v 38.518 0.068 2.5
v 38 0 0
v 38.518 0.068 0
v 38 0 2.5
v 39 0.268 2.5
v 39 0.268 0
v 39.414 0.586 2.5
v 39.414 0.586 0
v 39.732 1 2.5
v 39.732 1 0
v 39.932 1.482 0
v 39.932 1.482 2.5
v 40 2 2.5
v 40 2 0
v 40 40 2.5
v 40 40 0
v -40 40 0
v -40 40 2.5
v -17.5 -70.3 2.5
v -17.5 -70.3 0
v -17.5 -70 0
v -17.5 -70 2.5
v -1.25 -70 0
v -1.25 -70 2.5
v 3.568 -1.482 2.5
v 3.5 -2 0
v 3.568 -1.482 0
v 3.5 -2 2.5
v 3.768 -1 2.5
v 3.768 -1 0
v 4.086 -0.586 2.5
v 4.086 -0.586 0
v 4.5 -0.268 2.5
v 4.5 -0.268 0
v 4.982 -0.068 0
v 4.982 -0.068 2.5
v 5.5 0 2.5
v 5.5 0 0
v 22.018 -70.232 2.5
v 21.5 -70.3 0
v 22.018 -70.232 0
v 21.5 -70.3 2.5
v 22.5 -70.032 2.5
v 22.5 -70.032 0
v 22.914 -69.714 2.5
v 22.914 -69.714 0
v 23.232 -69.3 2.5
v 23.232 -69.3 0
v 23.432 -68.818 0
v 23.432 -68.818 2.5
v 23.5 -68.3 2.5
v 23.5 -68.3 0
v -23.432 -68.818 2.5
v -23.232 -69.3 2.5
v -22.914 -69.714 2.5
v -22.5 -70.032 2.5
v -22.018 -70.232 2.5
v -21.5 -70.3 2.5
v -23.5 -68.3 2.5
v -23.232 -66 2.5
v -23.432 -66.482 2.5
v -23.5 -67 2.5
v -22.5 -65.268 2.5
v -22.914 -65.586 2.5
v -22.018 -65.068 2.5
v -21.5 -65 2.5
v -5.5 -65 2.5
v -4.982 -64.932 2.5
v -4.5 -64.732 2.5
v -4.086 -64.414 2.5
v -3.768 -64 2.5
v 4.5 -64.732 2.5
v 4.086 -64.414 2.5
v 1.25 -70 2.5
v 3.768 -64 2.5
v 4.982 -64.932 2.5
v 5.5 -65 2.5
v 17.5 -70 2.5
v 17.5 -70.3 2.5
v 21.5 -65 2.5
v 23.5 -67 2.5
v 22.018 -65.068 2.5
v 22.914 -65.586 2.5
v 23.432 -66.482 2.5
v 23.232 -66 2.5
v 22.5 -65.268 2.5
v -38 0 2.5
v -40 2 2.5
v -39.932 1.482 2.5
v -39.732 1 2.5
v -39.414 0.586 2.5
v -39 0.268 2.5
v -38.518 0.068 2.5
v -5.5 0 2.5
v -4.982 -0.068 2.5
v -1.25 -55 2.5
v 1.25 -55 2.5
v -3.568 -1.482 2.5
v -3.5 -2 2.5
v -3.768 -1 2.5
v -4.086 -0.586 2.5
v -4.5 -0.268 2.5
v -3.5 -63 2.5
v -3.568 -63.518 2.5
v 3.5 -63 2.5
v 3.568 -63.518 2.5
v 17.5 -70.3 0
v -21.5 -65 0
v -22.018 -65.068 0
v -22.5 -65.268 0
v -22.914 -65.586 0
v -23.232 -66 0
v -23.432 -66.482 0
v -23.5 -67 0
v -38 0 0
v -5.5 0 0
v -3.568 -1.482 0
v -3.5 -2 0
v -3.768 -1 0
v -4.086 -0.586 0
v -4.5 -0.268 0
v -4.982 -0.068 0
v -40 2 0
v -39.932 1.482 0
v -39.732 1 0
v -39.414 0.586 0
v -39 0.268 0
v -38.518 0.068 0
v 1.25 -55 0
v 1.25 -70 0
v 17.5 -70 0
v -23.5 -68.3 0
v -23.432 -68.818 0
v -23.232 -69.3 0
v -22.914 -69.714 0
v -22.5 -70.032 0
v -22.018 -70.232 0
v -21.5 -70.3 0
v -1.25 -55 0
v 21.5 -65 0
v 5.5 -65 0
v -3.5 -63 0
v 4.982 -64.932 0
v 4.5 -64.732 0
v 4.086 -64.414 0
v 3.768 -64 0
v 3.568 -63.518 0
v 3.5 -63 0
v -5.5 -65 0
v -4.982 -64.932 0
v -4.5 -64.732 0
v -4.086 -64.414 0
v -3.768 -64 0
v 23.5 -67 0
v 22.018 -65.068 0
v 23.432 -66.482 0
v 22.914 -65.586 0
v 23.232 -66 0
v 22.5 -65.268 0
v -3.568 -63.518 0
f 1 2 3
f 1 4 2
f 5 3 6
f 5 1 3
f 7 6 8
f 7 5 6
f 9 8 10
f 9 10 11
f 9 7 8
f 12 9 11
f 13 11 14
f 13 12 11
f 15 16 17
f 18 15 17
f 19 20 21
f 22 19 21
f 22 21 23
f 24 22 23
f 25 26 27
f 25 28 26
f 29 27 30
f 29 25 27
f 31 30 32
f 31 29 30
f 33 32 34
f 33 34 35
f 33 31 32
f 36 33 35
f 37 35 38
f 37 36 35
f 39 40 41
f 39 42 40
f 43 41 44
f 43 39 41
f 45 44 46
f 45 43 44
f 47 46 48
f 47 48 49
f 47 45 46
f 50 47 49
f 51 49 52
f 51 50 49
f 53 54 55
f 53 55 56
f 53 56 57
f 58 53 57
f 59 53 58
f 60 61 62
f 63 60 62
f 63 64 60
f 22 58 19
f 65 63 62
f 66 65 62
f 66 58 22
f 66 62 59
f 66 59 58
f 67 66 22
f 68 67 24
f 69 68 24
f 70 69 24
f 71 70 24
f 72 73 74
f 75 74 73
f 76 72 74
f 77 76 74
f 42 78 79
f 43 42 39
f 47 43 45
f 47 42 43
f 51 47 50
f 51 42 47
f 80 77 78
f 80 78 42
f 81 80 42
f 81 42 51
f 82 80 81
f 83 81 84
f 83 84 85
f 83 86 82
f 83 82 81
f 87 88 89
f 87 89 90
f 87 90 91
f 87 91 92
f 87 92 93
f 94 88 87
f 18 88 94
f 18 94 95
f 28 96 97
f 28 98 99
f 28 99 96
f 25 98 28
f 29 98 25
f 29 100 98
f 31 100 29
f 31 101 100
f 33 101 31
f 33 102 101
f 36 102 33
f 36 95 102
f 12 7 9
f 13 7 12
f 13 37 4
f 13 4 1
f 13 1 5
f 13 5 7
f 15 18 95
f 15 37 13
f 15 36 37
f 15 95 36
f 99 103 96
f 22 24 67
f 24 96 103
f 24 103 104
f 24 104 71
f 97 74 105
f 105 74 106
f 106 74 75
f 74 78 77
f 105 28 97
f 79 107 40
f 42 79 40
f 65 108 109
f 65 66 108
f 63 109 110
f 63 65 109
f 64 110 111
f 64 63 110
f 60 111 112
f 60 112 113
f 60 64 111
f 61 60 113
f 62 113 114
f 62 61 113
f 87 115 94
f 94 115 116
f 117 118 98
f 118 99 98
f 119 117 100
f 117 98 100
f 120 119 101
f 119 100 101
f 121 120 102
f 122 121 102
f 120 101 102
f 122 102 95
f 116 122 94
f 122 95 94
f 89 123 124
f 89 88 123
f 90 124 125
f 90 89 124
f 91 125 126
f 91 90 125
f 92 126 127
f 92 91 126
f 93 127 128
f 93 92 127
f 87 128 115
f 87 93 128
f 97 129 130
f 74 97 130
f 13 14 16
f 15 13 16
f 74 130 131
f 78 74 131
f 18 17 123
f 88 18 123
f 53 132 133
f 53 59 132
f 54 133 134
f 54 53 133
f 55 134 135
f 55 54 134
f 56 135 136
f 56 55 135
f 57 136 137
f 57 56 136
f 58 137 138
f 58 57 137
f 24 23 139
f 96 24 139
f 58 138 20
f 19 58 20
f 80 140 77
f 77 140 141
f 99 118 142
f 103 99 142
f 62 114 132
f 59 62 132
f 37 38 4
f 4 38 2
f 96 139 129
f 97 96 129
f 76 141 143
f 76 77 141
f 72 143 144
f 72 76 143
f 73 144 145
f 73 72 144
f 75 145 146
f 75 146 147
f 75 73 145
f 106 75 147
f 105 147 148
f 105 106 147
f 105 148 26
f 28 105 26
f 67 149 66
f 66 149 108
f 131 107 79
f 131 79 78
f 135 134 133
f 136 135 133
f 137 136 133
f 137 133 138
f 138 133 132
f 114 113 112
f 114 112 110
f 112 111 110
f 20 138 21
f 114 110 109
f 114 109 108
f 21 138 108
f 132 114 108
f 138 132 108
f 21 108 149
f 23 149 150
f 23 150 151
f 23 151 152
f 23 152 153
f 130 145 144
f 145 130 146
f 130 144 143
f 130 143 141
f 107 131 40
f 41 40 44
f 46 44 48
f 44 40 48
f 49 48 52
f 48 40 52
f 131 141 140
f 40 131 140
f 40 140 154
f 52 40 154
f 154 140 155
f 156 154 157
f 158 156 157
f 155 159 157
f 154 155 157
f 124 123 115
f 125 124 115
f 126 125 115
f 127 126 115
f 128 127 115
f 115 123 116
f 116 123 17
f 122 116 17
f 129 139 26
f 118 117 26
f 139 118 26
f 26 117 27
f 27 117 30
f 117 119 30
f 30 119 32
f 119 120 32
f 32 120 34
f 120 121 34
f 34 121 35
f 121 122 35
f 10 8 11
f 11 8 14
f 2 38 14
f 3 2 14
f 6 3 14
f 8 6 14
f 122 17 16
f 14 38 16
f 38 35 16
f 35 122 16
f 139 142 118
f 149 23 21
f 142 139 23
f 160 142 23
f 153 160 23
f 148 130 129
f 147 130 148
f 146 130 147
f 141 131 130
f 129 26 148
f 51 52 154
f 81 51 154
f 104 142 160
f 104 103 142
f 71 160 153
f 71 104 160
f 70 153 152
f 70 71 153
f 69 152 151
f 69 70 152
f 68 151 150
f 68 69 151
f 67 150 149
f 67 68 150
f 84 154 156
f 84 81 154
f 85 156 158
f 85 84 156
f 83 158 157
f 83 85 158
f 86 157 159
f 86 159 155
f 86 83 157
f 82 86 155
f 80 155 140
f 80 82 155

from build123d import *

# Parameters (mm, degrees)
F0_W     = 6
F0_H     = 0.3
F1_DEPTH = 2.5
F2_R     = 2


# Not quite as in the source:
# - a feature names something its author has since deleted; it is built from what else it names


with BuildPart() as f1:
    # F0 (on Top) → F1 (new body)
    with BuildSketch(Plane.XY):
        Polygon((3.5, 0), (-3.5, 0), (-3.5, -65), (-23.5, -65), (-23.5, -70), (-17.5, -70), (-1.25, -70), (-1.25, -55), (1.25, -55), (1.25, -70), (17.5, -70), (23.5, -70), (23.5, -65), (3.5, -65), align=None)
        with Locations((-20.5, -70.15)):
            Rectangle(F0_W, F0_H)
        with Locations((20.5, -70.15)):
            Rectangle(F0_W, F0_H)
        Polygon((-40, 40), (-40, 0), (-3.5, 0), (3.5, 0), (40, 0), (40, 40), align=None)
    extrude(amount=F1_DEPTH)

    # F2
    f2_edges = [f1.edges().sort_by_distance(p)[0] for p in [
        (-3.5, 0, 1.25),
        (3.5, 0, 1.25),
        (3.5, -65, 1.25),
        (-3.5, -65, 1.25),
        (-23.5, -65, 1.25),
        (23.5, -65, 1.25),
        (-23.5, -70.3, 1.25),
        (23.5, -70.3, 1.25),
        (40, 0, 1.25),
        (-40, 0, 1.25),
    ]]
    fillet(f2_edges, radius=F2_R)


solid = f1.part
